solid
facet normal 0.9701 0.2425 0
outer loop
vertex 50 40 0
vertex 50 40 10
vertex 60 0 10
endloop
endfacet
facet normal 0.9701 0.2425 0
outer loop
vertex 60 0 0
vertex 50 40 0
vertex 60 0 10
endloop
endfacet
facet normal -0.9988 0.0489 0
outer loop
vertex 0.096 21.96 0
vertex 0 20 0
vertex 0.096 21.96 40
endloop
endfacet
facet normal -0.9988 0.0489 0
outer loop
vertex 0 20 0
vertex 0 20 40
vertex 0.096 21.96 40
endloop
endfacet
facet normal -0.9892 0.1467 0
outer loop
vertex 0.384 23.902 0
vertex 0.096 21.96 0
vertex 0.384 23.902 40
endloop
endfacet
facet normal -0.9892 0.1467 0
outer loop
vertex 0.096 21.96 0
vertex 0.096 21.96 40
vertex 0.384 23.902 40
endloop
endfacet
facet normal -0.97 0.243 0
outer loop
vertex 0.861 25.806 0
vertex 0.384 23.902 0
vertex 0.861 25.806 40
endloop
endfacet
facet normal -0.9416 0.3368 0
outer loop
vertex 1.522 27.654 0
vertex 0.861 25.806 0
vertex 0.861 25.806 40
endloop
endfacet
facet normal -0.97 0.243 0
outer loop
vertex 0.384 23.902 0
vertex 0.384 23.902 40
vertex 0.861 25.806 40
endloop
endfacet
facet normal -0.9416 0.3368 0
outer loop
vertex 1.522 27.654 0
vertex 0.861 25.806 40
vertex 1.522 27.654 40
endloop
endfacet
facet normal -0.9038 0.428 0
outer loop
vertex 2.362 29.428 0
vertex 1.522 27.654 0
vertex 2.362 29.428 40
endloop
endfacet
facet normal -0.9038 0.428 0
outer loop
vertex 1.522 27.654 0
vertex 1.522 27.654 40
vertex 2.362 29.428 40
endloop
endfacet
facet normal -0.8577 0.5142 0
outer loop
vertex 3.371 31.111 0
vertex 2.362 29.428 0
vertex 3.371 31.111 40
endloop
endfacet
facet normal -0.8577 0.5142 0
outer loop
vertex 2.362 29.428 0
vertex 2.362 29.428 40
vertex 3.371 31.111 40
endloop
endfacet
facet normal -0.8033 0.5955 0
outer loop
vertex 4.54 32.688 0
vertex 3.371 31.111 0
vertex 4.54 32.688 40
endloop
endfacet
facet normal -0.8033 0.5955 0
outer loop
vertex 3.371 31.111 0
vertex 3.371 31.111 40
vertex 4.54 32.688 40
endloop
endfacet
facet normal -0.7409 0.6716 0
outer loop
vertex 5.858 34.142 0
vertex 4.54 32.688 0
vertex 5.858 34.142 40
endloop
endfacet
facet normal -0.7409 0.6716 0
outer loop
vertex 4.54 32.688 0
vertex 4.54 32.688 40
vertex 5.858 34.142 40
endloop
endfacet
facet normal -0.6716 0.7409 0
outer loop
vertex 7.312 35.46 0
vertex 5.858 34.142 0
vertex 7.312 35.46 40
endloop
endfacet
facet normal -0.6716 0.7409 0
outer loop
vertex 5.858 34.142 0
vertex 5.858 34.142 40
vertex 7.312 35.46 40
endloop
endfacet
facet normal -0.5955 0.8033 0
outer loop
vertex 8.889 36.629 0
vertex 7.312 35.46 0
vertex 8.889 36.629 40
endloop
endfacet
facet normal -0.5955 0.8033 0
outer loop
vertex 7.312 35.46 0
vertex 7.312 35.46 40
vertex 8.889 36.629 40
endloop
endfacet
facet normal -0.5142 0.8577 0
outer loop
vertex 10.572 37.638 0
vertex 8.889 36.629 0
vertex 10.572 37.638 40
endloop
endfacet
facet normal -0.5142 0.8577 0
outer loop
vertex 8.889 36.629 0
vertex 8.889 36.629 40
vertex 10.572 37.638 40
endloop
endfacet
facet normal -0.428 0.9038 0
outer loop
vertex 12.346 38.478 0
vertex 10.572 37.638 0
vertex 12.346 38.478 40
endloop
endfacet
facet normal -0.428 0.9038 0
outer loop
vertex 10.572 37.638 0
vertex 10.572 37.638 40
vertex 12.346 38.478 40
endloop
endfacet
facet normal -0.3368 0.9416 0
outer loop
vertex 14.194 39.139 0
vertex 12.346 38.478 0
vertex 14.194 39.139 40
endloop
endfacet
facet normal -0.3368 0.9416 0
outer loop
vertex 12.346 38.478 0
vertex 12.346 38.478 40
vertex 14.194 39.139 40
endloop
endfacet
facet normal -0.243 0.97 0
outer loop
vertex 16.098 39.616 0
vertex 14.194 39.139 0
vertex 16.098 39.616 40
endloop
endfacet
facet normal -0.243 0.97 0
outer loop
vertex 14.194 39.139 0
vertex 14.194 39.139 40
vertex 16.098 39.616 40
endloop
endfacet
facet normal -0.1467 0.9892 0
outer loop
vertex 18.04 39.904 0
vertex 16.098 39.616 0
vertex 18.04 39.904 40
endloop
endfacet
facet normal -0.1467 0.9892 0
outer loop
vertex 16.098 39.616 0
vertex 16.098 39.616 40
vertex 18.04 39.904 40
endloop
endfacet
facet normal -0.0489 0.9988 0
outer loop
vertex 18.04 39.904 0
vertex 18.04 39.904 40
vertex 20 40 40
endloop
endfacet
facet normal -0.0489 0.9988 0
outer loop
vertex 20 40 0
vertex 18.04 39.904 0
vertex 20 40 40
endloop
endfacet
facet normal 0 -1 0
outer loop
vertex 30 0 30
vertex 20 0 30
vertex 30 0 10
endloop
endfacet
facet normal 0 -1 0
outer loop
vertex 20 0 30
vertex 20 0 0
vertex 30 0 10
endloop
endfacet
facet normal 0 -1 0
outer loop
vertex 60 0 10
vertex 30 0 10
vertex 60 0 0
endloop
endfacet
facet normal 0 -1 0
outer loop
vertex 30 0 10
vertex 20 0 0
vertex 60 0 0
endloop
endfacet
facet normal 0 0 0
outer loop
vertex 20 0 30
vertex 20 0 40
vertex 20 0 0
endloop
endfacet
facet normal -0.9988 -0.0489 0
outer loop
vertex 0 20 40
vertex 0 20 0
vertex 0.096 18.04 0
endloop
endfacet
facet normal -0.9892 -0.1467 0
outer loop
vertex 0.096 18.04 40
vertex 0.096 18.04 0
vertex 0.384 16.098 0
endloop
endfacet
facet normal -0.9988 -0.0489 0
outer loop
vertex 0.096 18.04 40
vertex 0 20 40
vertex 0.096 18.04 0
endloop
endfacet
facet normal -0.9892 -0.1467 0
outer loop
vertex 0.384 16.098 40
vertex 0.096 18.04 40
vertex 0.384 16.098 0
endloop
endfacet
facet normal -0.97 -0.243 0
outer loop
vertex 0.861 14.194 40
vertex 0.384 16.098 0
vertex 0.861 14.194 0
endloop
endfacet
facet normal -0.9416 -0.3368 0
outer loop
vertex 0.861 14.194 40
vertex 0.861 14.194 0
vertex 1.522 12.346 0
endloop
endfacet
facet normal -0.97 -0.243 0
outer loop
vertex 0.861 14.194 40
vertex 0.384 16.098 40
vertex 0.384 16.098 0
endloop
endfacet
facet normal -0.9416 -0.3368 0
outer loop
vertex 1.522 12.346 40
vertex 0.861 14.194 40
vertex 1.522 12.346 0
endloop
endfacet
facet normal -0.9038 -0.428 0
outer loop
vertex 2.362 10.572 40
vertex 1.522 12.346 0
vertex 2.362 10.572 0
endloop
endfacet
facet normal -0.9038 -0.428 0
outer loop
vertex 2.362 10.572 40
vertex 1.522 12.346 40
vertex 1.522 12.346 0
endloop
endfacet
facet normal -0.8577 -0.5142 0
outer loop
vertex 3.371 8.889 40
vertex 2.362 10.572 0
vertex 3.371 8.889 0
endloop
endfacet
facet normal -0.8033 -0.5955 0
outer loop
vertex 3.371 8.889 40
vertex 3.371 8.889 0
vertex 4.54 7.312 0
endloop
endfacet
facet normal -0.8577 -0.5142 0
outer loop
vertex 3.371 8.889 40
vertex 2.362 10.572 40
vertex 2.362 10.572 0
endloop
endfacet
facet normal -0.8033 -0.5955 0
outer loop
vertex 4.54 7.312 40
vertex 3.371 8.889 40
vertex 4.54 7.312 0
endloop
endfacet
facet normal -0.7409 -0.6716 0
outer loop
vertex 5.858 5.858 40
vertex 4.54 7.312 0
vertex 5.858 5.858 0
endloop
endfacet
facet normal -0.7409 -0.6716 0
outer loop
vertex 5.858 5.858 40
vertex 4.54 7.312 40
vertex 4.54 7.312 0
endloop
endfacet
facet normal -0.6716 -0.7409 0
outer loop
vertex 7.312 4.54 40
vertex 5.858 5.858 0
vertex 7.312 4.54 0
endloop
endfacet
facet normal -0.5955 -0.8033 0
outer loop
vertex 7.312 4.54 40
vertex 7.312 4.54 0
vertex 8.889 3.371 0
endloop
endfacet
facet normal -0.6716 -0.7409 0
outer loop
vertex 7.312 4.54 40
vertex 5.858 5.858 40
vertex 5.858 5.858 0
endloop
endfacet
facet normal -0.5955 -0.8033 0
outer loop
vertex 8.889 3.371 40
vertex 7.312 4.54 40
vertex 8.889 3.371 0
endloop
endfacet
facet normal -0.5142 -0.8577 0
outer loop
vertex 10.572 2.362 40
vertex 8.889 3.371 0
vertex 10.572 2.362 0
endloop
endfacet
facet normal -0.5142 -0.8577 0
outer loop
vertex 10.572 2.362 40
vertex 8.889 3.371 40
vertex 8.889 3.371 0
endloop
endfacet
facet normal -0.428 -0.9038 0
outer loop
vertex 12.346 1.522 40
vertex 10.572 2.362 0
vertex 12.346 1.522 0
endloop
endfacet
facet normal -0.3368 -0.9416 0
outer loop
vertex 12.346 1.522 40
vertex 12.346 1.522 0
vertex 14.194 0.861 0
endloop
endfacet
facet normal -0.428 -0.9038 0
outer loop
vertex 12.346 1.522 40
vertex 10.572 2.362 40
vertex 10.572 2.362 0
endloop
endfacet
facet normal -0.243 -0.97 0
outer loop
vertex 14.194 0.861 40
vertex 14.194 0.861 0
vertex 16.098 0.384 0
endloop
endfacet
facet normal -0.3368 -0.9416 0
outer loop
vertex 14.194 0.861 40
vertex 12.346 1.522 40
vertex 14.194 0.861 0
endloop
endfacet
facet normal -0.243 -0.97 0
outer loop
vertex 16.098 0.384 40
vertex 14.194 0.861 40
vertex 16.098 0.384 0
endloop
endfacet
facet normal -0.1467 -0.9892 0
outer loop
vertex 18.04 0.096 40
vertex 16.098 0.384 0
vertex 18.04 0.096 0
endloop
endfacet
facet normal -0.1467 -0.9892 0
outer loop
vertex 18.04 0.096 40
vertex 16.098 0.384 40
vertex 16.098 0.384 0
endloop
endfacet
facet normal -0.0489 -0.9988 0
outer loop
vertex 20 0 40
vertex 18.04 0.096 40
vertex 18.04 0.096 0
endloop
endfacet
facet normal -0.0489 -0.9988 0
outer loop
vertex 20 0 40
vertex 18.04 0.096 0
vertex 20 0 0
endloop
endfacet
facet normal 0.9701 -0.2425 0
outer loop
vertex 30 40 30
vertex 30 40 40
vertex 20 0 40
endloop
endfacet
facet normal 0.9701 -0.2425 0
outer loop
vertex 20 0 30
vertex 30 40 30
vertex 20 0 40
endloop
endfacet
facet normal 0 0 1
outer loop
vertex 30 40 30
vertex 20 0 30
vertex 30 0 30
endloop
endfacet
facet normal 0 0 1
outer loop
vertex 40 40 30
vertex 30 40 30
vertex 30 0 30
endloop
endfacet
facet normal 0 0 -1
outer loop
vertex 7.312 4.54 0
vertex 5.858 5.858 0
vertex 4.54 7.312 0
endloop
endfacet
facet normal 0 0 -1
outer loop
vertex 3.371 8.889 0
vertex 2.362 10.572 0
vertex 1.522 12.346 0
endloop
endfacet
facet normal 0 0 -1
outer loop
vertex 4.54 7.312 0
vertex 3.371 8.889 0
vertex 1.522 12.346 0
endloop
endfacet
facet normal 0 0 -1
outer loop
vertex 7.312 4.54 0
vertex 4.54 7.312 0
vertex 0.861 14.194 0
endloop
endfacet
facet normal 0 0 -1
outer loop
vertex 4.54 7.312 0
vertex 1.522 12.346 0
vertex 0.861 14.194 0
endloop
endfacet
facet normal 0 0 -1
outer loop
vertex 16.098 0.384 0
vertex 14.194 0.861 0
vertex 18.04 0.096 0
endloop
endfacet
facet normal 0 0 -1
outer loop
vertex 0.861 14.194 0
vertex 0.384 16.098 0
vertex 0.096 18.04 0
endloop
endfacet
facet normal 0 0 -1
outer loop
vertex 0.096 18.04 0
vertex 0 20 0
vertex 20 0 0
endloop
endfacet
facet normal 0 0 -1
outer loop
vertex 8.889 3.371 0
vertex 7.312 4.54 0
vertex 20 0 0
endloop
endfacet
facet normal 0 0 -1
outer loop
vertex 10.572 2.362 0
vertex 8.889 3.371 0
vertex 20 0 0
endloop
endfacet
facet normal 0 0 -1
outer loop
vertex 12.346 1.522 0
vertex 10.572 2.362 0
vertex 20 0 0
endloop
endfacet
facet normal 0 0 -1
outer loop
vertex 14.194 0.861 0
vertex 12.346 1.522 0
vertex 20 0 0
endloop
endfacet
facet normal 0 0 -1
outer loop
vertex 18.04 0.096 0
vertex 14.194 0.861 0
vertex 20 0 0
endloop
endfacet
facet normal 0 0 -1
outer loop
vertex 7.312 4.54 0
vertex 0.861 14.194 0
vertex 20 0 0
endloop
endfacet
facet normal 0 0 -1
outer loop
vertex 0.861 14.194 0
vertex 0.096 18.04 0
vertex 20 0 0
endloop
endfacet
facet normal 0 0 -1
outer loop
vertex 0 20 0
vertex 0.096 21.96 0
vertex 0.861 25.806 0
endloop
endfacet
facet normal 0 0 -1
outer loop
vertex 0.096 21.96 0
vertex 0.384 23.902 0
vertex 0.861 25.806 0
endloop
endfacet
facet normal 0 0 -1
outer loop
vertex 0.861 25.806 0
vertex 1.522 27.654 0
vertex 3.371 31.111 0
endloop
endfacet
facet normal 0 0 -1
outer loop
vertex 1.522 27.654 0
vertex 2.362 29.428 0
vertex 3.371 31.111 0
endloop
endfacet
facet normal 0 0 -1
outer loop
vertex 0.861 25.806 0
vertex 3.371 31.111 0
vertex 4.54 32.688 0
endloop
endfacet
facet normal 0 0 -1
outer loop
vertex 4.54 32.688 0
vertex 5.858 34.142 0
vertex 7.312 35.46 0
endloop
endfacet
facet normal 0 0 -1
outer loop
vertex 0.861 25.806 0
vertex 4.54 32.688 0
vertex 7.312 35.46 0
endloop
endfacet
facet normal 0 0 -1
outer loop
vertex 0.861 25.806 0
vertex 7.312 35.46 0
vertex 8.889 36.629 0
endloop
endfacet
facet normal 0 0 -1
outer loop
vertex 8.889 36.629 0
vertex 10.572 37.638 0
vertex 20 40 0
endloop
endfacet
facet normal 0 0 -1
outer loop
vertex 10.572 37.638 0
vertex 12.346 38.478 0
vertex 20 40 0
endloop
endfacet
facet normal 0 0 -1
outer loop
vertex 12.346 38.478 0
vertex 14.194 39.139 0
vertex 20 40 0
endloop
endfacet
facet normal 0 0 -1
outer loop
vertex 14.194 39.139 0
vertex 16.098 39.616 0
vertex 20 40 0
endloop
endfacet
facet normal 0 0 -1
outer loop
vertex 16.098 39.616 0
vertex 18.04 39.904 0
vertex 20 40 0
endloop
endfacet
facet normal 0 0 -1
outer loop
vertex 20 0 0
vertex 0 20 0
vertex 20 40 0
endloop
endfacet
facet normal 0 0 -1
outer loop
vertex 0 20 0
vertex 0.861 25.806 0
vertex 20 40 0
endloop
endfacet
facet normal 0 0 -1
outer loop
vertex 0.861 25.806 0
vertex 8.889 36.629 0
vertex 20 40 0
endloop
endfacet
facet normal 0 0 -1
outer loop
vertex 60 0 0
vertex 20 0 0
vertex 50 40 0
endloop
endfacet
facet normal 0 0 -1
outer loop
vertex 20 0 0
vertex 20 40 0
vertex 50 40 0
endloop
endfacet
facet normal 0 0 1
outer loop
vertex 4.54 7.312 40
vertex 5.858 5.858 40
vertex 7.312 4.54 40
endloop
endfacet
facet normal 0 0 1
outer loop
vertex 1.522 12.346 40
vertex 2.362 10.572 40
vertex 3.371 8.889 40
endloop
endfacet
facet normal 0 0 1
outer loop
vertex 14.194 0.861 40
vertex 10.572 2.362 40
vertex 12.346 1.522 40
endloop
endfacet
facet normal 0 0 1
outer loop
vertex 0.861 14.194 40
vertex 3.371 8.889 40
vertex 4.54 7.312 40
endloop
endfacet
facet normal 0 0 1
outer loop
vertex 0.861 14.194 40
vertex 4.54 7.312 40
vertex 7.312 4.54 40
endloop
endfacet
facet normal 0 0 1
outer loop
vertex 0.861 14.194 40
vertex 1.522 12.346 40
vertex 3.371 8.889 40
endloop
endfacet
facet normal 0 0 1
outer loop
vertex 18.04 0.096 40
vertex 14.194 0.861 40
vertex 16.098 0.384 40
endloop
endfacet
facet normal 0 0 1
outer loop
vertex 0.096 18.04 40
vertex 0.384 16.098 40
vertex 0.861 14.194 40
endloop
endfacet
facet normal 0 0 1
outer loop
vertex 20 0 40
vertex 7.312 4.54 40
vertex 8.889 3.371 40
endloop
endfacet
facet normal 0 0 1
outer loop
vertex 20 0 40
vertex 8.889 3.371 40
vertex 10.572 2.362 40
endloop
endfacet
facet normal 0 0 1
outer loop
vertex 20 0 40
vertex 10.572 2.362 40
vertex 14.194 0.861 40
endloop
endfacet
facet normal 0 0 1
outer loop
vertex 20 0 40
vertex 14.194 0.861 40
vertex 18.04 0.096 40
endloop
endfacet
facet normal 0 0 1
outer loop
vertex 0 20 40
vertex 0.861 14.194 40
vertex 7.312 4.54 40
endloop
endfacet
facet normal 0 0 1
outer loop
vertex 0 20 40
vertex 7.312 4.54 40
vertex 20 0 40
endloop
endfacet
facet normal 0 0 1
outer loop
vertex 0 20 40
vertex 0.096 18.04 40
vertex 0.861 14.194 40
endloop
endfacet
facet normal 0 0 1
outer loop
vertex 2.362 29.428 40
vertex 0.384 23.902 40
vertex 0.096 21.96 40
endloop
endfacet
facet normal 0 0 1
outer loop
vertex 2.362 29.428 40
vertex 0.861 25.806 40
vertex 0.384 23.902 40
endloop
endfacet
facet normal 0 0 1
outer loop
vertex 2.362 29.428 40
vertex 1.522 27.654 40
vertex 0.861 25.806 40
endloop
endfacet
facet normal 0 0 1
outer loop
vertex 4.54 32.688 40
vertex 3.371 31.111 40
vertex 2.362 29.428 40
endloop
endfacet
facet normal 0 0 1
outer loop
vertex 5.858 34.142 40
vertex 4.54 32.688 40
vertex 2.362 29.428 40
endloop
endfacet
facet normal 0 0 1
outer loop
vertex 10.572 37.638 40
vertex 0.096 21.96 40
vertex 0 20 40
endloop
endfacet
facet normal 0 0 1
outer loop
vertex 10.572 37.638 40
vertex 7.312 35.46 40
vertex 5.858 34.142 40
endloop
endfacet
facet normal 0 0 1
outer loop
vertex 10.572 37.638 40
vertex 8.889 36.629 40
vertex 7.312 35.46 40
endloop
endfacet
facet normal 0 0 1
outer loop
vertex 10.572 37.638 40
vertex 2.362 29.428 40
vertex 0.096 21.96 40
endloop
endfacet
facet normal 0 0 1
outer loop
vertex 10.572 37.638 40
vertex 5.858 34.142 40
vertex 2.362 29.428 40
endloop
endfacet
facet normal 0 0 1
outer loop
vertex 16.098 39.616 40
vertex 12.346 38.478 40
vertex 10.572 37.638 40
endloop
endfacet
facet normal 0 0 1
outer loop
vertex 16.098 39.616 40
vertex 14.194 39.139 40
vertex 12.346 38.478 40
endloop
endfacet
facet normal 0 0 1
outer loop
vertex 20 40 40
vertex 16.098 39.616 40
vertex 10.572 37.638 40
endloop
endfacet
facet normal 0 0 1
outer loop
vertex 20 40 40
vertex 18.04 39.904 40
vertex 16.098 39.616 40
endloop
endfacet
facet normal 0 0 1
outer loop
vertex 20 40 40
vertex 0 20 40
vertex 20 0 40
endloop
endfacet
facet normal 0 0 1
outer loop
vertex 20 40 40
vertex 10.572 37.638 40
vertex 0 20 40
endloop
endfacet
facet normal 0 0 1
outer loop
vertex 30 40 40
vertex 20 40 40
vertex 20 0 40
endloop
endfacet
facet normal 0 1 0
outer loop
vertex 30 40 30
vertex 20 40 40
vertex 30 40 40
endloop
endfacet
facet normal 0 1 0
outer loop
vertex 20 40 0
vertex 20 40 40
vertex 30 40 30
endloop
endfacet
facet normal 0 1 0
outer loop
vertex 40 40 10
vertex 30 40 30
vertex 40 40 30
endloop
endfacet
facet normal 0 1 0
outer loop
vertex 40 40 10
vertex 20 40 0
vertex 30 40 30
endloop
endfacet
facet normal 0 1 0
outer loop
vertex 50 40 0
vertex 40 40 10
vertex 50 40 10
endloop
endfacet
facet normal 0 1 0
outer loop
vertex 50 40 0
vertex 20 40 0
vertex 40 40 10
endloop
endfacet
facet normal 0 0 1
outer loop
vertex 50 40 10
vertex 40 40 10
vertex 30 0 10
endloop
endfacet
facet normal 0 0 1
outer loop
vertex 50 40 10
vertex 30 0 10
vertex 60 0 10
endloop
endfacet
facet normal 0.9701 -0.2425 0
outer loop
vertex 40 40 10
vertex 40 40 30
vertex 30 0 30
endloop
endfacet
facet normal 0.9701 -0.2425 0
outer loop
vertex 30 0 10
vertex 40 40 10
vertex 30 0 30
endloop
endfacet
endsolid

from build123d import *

# Parameters (mm, degrees)
F0_W     = 60
F0_H     = 40
F1_DEPTH = 40
F2_R     = 19.99999
F4_DEPTH = 40
F6_DEPTH = 30
F8_DEPTH = 10


# Not quite as in the source:
# - a fillet or chamfer is up to 0.001 mm smaller than in the source, because OpenCascade refuses the exact size


with BuildPart() as f1:
    # F0 (on Top) → F1 (new body)
    with BuildSketch(Plane.XY):
        with Locations((30, 20)):
            Rectangle(F0_W, F0_H)
    extrude(amount=F1_DEPTH)

    # F2 (radius 20 in the source; OpenCascade refuses exactly that, so slightly less here)
    f2_edges = [f1.edges().sort_by_distance(p)[0] for p in [
        (0, 40, 20),
        (0, 0, 20),
    ]]
    fillet(f2_edges, radius=F2_R)

    # F3 (on face) → F4 (cut)
    with BuildSketch(Plane.XY.offset(40)):
        Polygon((60, 0), (60, 40), (50, 40), align=None)
    extrude(amount=-F4_DEPTH, mode=Mode.SUBTRACT)

    # F5 (on face) → F6 (cut)
    with BuildSketch(Plane.XY.offset(40)):
        Polygon((60, 0), (50, 40), (40, 40), (30, 0), align=None)
    extrude(amount=-F6_DEPTH, mode=Mode.SUBTRACT)

    # F7 (on face) → F8 (cut)
    with BuildSketch(Plane.XY.offset(40)):
        Polygon((30, 0), (40, 40), (30, 40), (20, 0), align=None)
    extrude(amount=-F8_DEPTH, mode=Mode.SUBTRACT)


solid = f1.part
